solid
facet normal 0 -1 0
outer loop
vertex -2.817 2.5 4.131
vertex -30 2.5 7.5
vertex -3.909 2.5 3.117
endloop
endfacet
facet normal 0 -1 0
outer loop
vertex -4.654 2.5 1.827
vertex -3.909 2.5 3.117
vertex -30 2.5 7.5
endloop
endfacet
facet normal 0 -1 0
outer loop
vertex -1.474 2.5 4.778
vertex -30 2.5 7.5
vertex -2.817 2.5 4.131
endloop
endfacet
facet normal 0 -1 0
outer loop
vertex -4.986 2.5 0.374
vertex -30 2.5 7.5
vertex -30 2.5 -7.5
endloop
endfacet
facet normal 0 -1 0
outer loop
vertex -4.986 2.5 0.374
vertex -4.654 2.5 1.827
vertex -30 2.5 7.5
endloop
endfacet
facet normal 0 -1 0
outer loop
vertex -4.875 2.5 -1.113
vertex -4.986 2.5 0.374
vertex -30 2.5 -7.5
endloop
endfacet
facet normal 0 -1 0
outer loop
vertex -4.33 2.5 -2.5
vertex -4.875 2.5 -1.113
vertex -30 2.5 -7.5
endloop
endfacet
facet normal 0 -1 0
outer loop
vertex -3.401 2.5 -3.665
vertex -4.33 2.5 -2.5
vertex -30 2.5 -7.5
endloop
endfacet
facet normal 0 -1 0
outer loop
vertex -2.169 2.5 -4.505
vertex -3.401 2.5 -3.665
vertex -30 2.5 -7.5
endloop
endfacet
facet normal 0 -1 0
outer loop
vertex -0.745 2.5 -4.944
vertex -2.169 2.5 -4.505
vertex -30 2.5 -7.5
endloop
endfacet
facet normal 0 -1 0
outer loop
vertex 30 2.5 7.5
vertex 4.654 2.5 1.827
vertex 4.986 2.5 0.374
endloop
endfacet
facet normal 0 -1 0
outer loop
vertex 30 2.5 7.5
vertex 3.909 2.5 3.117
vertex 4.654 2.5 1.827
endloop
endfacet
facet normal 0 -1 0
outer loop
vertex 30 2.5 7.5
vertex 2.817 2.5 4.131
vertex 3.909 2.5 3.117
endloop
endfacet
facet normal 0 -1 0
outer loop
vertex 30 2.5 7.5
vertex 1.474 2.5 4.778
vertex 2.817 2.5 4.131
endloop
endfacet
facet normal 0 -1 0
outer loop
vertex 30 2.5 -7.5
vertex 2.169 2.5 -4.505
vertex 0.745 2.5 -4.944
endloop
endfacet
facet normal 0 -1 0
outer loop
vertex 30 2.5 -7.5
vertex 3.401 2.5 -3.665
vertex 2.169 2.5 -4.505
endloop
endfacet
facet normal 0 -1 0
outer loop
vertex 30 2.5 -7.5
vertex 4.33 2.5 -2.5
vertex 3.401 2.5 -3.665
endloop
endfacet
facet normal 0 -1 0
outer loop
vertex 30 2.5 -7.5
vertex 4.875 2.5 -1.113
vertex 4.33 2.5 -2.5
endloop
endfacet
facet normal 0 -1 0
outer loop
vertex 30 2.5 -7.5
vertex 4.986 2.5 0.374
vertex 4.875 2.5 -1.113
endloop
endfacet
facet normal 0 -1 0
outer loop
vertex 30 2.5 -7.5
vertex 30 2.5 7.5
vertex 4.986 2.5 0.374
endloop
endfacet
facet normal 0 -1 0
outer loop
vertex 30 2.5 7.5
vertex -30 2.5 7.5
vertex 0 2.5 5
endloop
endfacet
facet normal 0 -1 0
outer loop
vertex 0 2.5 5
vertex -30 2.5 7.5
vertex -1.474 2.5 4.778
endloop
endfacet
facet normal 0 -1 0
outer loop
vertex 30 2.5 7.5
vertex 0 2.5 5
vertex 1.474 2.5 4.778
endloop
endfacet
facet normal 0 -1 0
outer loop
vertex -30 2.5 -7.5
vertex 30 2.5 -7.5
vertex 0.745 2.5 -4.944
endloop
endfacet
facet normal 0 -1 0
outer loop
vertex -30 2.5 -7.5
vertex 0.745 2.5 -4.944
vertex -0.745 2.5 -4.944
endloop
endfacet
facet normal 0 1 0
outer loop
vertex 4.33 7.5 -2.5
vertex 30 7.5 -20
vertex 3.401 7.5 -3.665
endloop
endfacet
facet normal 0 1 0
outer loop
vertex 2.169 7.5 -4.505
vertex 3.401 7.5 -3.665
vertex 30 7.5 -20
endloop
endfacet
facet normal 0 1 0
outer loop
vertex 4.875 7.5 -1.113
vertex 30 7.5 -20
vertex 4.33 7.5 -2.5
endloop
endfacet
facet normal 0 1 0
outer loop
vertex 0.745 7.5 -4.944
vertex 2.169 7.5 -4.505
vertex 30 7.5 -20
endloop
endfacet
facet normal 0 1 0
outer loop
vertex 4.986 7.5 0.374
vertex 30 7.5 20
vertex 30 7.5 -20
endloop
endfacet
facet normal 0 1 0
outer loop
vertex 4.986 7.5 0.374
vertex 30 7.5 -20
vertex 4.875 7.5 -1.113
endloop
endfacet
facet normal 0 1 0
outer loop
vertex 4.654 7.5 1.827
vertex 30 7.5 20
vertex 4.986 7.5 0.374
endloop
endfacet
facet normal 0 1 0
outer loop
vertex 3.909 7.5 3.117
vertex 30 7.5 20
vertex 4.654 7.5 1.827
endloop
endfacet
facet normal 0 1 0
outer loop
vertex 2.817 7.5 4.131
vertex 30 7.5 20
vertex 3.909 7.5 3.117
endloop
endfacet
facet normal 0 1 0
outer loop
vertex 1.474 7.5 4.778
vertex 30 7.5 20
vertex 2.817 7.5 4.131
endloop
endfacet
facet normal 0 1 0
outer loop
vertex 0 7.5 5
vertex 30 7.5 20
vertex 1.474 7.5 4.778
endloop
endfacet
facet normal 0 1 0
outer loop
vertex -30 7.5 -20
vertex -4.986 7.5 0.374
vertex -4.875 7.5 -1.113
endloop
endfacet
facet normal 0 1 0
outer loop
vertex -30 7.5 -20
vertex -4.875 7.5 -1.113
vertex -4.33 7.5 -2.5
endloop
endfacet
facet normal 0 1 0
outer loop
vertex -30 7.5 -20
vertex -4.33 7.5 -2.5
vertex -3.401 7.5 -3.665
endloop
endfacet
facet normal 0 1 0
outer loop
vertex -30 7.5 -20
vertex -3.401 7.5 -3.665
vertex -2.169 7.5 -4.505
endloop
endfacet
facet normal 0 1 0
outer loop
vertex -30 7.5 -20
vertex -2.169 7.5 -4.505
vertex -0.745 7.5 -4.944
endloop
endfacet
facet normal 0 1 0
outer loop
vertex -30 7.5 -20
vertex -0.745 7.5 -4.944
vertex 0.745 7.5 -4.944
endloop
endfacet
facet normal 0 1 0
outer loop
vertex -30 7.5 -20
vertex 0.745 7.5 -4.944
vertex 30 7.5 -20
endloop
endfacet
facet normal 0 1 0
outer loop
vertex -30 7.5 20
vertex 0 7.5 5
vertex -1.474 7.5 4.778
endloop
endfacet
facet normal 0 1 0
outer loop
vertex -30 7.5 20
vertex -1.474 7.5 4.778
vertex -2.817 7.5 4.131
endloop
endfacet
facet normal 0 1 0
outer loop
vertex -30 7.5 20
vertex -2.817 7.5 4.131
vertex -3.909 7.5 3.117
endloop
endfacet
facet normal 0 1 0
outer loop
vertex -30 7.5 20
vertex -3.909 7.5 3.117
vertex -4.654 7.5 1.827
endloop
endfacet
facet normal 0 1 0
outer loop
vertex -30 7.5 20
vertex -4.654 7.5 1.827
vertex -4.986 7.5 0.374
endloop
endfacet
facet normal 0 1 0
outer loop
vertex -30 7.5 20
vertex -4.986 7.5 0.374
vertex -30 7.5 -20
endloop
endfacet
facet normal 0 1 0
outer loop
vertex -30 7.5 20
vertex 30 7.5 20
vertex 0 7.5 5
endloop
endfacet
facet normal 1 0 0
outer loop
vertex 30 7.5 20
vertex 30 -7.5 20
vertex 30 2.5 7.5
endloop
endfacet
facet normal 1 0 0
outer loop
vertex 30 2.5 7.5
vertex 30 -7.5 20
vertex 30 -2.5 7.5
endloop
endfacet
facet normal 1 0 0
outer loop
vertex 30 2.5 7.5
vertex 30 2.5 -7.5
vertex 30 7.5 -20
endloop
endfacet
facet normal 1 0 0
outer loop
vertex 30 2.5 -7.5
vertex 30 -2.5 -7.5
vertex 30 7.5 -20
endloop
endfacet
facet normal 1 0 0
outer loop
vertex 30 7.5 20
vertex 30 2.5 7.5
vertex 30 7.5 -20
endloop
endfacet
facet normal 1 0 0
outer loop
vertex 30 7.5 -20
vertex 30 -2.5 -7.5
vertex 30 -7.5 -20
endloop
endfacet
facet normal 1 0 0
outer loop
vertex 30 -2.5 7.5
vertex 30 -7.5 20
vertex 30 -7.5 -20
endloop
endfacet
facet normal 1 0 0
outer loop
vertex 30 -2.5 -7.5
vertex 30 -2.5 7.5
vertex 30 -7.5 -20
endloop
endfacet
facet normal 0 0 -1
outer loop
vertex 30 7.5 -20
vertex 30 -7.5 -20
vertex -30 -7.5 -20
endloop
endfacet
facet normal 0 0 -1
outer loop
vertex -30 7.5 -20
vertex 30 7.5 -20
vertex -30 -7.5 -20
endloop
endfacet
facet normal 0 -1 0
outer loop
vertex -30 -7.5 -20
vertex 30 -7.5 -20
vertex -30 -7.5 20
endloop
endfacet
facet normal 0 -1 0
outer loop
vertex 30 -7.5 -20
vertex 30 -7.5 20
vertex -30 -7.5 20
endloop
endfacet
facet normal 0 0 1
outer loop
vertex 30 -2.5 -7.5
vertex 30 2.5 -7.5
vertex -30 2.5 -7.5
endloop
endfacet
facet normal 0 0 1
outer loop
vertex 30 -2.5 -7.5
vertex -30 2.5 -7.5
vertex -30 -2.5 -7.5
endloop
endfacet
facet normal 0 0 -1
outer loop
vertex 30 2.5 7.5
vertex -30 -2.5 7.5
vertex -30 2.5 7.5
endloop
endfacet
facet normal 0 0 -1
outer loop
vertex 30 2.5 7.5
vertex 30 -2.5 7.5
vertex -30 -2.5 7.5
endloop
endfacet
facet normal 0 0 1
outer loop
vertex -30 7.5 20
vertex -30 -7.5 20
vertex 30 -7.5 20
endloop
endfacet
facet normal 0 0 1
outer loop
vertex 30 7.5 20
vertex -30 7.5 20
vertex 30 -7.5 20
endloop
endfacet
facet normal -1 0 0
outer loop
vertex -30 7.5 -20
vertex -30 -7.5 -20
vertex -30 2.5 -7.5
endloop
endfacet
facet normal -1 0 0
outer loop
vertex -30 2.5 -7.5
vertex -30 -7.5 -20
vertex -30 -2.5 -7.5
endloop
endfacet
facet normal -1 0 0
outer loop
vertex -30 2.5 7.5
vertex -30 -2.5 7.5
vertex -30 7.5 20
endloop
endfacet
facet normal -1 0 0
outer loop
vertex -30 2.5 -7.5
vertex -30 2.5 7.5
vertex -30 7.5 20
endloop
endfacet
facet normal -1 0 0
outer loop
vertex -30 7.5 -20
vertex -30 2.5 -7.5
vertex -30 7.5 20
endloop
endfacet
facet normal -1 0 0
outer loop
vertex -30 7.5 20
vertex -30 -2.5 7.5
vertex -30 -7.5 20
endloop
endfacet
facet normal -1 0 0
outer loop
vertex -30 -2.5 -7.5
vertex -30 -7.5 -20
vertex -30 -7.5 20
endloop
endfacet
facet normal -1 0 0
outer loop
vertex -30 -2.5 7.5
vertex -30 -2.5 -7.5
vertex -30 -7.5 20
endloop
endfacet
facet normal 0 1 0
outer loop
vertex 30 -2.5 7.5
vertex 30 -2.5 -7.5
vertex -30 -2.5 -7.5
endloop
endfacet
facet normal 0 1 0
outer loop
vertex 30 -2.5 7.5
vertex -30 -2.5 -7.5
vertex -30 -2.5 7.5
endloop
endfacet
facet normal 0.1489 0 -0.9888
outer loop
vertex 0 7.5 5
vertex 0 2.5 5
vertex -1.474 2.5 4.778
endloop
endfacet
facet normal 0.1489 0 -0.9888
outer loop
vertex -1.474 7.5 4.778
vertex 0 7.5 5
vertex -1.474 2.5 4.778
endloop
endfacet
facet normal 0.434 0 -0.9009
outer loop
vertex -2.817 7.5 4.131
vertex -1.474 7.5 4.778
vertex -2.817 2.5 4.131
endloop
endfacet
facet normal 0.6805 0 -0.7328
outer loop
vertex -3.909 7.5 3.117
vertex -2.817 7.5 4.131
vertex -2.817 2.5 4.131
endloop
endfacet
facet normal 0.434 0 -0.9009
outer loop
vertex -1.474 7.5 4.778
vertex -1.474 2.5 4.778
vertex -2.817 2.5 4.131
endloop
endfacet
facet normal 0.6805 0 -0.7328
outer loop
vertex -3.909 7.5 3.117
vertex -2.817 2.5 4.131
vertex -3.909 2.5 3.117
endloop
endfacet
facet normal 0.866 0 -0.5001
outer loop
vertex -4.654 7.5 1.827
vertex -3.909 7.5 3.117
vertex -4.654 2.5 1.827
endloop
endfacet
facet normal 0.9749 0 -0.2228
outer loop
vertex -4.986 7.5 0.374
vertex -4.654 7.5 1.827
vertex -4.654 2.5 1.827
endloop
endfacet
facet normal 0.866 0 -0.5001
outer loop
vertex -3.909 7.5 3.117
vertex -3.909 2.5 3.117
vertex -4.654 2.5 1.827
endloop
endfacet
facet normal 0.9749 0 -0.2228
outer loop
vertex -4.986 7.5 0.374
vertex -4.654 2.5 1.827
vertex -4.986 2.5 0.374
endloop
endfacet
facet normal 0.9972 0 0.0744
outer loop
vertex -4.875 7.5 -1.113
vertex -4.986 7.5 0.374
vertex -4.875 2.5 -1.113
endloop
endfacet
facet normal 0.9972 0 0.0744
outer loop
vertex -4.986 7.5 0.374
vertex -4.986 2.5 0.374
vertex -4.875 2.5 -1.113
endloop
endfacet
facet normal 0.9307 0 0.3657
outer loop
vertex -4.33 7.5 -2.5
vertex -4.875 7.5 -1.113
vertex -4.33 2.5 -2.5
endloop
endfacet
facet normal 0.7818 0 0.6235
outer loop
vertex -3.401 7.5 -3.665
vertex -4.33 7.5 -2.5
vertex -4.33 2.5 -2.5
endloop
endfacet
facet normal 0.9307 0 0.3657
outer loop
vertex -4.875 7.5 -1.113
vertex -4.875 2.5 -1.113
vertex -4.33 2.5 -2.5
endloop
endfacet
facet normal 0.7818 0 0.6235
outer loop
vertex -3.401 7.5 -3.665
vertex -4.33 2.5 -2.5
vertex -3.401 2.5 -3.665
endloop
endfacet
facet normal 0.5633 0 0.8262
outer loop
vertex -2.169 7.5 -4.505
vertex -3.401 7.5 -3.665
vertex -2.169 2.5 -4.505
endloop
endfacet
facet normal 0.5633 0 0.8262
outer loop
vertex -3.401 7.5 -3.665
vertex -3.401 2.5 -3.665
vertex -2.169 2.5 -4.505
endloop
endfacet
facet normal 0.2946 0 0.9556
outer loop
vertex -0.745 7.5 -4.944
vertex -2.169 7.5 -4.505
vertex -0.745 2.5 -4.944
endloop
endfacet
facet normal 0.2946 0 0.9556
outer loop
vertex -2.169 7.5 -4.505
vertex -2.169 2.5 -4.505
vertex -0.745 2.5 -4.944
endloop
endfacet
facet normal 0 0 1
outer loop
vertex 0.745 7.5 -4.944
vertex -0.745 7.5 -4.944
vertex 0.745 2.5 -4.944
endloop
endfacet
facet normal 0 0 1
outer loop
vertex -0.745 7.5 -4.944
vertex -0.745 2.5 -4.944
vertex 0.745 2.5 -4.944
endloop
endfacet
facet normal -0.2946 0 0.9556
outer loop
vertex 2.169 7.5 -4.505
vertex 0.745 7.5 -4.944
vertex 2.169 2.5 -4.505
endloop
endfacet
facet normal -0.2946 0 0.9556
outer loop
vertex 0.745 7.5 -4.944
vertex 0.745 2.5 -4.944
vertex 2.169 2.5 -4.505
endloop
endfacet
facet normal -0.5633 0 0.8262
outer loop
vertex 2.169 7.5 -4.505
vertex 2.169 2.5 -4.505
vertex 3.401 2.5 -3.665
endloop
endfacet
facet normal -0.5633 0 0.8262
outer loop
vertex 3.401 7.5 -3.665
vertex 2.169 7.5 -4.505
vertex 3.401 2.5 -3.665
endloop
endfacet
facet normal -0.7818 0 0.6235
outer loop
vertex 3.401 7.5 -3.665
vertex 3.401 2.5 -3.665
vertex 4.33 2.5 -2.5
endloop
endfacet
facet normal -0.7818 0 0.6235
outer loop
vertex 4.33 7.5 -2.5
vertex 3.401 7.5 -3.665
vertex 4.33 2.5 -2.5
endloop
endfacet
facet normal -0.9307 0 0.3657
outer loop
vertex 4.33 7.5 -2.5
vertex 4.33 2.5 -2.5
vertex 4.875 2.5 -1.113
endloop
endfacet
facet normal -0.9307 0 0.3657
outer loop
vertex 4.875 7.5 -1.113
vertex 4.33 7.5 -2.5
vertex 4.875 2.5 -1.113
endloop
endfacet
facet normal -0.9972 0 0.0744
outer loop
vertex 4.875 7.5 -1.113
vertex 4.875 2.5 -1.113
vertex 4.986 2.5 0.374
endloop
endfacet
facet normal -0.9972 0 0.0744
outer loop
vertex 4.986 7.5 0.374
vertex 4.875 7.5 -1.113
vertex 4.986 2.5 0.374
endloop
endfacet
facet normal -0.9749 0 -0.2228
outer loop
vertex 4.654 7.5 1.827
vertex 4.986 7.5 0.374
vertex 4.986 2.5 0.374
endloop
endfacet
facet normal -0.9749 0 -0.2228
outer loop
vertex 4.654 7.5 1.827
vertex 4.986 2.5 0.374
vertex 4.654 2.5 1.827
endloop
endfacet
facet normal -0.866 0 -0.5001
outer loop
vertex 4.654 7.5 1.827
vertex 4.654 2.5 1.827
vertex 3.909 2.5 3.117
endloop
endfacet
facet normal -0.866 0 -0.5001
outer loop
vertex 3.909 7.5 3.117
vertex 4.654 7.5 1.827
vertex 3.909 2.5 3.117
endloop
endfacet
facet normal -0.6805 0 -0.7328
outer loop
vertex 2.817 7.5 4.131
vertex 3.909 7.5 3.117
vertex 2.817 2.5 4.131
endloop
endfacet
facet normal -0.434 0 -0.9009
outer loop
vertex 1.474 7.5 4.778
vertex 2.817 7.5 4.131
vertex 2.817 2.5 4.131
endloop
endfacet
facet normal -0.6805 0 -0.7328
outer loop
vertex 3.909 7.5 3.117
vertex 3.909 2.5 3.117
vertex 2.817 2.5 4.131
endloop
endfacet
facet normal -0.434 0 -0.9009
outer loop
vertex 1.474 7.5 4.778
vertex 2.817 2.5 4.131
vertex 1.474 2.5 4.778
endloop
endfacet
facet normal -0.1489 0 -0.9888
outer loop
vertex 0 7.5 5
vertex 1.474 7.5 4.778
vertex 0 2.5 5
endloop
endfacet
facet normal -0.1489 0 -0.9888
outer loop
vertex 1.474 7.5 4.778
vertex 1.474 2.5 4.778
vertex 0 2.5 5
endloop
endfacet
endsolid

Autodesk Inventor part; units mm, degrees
ref_plane "YZ Plane" through (0, 0, 0) normal (1, 0, 0) x (0, 1, 0)
ref_plane "XZ Plane" through (0, 0, 0) normal (0, 1, 0) x (-1, 0, 0)
ref_plane "XY Plane" through (0, 0, 0) normal (0, 0, 1) x (1, 0, 0)
sketch "Эскиз4" plane through (0, 0, 0) normal (0, 1, 0) x (-1, 0, 0)
  line L0 (30, 20) -> (-30, 20)
  line L1 (-30, 20) -> (-30, -20)
  line L2 (-30, -20) -> (30, -20)
  line L3 (30, -20) -> (30, 20)
  point P0 (0, 0)
  dimension "d16" = 40
  dimension "d17" = 20
  dimension "d18" = 60
  dimension "d19" = 30
extrude "Выдавливание4" add sketch "Эскиз4" along normal mid plane 15
sketch "Эскиз6" plane through (30, -7.5, -20) normal (1, 0, 0) x (0, 0, -1)
  line L0 (-12.5, 5) -> (-27.5, 5)
  line L1 (-27.5, 5) -> (-27.5, 10)
  line L2 (-27.5, 10) -> (-12.5, 10)
  line L3 (-12.5, 10) -> (-12.5, 5)
  point P0 (-20, 7.5)
  dimension "d25" = 5
  dimension "d26" = 15
  dimension "d27" = 7.5
  dimension "d28" = 2.5
extrude "Выдавливание5" cut sketch "Эскиз6" against normal through all
sketch "Эскиз7" plane through (0, 7.5, 0) normal (0, 1, 0) x (1, 0, 0)
  point P0 (0, 0)
  point P1 (0, 0)
hole "Отверстие2" at (0, 7.5, 0) direction (0, -1, 0) diameter 10 depth 5
equation "\"d17\" = 0.5 * d16"
equation "\"d19\" = 0.5 * d18"
equation "\"d27\" = 0.5 * d26"
equation "\"d28\" = 0.5 * d25"
properties part number "Каменъ"
